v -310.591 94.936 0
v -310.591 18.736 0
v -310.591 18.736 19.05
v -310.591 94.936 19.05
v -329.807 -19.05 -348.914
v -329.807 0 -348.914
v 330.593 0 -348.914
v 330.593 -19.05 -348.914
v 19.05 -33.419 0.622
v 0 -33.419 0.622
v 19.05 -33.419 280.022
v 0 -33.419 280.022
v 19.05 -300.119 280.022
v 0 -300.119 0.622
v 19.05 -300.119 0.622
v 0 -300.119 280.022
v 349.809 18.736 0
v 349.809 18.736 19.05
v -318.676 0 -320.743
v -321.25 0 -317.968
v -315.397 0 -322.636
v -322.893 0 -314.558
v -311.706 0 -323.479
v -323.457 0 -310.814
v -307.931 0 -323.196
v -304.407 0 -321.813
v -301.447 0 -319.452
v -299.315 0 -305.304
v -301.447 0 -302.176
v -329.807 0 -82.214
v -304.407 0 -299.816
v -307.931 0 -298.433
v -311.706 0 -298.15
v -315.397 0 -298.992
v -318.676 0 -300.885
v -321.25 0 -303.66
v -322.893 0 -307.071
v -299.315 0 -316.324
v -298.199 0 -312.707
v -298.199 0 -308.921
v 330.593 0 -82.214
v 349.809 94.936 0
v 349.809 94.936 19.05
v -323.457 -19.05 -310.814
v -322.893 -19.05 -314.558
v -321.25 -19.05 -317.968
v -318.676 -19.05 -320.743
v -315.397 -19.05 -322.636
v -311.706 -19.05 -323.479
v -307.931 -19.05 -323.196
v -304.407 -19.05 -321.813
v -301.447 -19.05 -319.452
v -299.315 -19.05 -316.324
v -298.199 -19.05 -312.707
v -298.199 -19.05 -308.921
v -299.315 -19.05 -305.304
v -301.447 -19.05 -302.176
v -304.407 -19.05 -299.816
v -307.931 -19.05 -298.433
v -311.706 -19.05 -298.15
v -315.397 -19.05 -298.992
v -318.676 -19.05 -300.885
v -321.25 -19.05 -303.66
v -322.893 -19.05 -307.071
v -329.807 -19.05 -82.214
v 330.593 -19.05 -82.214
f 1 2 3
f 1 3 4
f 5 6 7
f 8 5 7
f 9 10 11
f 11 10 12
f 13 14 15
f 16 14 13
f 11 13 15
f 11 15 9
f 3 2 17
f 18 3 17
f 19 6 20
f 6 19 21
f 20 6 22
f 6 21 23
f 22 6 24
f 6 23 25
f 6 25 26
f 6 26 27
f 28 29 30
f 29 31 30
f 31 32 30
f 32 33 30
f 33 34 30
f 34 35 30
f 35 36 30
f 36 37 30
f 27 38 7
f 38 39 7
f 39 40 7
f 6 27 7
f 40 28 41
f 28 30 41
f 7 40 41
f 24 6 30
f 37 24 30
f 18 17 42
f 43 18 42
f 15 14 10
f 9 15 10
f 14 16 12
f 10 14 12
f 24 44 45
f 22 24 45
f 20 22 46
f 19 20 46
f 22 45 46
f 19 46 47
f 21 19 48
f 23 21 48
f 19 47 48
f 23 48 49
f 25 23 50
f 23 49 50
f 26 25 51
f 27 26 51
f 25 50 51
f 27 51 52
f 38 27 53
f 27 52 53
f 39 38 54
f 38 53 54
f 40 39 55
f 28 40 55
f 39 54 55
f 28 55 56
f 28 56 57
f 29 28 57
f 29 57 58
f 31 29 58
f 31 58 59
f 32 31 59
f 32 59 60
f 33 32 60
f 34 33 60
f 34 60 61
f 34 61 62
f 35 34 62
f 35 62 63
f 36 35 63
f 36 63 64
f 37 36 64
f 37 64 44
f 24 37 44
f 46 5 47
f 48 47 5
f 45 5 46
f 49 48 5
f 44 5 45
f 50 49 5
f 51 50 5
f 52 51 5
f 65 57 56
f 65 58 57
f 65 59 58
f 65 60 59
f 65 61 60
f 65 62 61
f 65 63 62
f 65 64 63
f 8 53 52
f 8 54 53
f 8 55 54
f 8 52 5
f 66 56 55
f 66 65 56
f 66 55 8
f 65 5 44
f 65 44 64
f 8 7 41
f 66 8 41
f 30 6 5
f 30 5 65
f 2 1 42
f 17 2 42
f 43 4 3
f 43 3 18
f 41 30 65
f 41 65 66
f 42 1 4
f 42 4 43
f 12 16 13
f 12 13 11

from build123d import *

# Parameters (mm, degrees)
F0_W     = 660.4
F0_H     = 266.7
F1_DEPTH = 19.05
F2_W     = 660.4
F2_H     = 76.2
F3_DEPTH = 19.05
F4_W     = 266.7
F4_H     = 279.4
F5_DEPTH = 19.05
F6_D     = 25.4


with BuildPart() as f1:
    # F0 (on Front) → F1 (new body)
    with BuildSketch(Plane.XZ):
        with Locations((0.3927573562, -215.5641628401)):
            Rectangle(F0_W, F0_H)
    extrude(amount=F1_DEPTH)

    # F6 (through all)
    with Locations(Plane(origin=(0, 0, 0), x_dir=(1, 0, 0), z_dir=(0, 1, 0))):
        with Locations((-310.7572426438, 310.8141628401)):
            Hole(F6_D / 2)


with BuildPart() as f3:
    # F2 (on Top) → F3 (new body)
    with BuildSketch(Plane.XY):
        with Locations((19.6088701487, 56.8355319258)):
            Rectangle(F2_W, F2_H)
    extrude(amount=F3_DEPTH)


with BuildPart() as f5:
    # F4 (on Right) → F5 (new body)
    with BuildSketch(Plane.YZ):
        with Locations((-166.7686700821, 140.3216040973)):
            Rectangle(F4_W, F4_H)
    extrude(amount=F5_DEPTH)


solid = Compound([f1.part, f3.part, f5.part])
